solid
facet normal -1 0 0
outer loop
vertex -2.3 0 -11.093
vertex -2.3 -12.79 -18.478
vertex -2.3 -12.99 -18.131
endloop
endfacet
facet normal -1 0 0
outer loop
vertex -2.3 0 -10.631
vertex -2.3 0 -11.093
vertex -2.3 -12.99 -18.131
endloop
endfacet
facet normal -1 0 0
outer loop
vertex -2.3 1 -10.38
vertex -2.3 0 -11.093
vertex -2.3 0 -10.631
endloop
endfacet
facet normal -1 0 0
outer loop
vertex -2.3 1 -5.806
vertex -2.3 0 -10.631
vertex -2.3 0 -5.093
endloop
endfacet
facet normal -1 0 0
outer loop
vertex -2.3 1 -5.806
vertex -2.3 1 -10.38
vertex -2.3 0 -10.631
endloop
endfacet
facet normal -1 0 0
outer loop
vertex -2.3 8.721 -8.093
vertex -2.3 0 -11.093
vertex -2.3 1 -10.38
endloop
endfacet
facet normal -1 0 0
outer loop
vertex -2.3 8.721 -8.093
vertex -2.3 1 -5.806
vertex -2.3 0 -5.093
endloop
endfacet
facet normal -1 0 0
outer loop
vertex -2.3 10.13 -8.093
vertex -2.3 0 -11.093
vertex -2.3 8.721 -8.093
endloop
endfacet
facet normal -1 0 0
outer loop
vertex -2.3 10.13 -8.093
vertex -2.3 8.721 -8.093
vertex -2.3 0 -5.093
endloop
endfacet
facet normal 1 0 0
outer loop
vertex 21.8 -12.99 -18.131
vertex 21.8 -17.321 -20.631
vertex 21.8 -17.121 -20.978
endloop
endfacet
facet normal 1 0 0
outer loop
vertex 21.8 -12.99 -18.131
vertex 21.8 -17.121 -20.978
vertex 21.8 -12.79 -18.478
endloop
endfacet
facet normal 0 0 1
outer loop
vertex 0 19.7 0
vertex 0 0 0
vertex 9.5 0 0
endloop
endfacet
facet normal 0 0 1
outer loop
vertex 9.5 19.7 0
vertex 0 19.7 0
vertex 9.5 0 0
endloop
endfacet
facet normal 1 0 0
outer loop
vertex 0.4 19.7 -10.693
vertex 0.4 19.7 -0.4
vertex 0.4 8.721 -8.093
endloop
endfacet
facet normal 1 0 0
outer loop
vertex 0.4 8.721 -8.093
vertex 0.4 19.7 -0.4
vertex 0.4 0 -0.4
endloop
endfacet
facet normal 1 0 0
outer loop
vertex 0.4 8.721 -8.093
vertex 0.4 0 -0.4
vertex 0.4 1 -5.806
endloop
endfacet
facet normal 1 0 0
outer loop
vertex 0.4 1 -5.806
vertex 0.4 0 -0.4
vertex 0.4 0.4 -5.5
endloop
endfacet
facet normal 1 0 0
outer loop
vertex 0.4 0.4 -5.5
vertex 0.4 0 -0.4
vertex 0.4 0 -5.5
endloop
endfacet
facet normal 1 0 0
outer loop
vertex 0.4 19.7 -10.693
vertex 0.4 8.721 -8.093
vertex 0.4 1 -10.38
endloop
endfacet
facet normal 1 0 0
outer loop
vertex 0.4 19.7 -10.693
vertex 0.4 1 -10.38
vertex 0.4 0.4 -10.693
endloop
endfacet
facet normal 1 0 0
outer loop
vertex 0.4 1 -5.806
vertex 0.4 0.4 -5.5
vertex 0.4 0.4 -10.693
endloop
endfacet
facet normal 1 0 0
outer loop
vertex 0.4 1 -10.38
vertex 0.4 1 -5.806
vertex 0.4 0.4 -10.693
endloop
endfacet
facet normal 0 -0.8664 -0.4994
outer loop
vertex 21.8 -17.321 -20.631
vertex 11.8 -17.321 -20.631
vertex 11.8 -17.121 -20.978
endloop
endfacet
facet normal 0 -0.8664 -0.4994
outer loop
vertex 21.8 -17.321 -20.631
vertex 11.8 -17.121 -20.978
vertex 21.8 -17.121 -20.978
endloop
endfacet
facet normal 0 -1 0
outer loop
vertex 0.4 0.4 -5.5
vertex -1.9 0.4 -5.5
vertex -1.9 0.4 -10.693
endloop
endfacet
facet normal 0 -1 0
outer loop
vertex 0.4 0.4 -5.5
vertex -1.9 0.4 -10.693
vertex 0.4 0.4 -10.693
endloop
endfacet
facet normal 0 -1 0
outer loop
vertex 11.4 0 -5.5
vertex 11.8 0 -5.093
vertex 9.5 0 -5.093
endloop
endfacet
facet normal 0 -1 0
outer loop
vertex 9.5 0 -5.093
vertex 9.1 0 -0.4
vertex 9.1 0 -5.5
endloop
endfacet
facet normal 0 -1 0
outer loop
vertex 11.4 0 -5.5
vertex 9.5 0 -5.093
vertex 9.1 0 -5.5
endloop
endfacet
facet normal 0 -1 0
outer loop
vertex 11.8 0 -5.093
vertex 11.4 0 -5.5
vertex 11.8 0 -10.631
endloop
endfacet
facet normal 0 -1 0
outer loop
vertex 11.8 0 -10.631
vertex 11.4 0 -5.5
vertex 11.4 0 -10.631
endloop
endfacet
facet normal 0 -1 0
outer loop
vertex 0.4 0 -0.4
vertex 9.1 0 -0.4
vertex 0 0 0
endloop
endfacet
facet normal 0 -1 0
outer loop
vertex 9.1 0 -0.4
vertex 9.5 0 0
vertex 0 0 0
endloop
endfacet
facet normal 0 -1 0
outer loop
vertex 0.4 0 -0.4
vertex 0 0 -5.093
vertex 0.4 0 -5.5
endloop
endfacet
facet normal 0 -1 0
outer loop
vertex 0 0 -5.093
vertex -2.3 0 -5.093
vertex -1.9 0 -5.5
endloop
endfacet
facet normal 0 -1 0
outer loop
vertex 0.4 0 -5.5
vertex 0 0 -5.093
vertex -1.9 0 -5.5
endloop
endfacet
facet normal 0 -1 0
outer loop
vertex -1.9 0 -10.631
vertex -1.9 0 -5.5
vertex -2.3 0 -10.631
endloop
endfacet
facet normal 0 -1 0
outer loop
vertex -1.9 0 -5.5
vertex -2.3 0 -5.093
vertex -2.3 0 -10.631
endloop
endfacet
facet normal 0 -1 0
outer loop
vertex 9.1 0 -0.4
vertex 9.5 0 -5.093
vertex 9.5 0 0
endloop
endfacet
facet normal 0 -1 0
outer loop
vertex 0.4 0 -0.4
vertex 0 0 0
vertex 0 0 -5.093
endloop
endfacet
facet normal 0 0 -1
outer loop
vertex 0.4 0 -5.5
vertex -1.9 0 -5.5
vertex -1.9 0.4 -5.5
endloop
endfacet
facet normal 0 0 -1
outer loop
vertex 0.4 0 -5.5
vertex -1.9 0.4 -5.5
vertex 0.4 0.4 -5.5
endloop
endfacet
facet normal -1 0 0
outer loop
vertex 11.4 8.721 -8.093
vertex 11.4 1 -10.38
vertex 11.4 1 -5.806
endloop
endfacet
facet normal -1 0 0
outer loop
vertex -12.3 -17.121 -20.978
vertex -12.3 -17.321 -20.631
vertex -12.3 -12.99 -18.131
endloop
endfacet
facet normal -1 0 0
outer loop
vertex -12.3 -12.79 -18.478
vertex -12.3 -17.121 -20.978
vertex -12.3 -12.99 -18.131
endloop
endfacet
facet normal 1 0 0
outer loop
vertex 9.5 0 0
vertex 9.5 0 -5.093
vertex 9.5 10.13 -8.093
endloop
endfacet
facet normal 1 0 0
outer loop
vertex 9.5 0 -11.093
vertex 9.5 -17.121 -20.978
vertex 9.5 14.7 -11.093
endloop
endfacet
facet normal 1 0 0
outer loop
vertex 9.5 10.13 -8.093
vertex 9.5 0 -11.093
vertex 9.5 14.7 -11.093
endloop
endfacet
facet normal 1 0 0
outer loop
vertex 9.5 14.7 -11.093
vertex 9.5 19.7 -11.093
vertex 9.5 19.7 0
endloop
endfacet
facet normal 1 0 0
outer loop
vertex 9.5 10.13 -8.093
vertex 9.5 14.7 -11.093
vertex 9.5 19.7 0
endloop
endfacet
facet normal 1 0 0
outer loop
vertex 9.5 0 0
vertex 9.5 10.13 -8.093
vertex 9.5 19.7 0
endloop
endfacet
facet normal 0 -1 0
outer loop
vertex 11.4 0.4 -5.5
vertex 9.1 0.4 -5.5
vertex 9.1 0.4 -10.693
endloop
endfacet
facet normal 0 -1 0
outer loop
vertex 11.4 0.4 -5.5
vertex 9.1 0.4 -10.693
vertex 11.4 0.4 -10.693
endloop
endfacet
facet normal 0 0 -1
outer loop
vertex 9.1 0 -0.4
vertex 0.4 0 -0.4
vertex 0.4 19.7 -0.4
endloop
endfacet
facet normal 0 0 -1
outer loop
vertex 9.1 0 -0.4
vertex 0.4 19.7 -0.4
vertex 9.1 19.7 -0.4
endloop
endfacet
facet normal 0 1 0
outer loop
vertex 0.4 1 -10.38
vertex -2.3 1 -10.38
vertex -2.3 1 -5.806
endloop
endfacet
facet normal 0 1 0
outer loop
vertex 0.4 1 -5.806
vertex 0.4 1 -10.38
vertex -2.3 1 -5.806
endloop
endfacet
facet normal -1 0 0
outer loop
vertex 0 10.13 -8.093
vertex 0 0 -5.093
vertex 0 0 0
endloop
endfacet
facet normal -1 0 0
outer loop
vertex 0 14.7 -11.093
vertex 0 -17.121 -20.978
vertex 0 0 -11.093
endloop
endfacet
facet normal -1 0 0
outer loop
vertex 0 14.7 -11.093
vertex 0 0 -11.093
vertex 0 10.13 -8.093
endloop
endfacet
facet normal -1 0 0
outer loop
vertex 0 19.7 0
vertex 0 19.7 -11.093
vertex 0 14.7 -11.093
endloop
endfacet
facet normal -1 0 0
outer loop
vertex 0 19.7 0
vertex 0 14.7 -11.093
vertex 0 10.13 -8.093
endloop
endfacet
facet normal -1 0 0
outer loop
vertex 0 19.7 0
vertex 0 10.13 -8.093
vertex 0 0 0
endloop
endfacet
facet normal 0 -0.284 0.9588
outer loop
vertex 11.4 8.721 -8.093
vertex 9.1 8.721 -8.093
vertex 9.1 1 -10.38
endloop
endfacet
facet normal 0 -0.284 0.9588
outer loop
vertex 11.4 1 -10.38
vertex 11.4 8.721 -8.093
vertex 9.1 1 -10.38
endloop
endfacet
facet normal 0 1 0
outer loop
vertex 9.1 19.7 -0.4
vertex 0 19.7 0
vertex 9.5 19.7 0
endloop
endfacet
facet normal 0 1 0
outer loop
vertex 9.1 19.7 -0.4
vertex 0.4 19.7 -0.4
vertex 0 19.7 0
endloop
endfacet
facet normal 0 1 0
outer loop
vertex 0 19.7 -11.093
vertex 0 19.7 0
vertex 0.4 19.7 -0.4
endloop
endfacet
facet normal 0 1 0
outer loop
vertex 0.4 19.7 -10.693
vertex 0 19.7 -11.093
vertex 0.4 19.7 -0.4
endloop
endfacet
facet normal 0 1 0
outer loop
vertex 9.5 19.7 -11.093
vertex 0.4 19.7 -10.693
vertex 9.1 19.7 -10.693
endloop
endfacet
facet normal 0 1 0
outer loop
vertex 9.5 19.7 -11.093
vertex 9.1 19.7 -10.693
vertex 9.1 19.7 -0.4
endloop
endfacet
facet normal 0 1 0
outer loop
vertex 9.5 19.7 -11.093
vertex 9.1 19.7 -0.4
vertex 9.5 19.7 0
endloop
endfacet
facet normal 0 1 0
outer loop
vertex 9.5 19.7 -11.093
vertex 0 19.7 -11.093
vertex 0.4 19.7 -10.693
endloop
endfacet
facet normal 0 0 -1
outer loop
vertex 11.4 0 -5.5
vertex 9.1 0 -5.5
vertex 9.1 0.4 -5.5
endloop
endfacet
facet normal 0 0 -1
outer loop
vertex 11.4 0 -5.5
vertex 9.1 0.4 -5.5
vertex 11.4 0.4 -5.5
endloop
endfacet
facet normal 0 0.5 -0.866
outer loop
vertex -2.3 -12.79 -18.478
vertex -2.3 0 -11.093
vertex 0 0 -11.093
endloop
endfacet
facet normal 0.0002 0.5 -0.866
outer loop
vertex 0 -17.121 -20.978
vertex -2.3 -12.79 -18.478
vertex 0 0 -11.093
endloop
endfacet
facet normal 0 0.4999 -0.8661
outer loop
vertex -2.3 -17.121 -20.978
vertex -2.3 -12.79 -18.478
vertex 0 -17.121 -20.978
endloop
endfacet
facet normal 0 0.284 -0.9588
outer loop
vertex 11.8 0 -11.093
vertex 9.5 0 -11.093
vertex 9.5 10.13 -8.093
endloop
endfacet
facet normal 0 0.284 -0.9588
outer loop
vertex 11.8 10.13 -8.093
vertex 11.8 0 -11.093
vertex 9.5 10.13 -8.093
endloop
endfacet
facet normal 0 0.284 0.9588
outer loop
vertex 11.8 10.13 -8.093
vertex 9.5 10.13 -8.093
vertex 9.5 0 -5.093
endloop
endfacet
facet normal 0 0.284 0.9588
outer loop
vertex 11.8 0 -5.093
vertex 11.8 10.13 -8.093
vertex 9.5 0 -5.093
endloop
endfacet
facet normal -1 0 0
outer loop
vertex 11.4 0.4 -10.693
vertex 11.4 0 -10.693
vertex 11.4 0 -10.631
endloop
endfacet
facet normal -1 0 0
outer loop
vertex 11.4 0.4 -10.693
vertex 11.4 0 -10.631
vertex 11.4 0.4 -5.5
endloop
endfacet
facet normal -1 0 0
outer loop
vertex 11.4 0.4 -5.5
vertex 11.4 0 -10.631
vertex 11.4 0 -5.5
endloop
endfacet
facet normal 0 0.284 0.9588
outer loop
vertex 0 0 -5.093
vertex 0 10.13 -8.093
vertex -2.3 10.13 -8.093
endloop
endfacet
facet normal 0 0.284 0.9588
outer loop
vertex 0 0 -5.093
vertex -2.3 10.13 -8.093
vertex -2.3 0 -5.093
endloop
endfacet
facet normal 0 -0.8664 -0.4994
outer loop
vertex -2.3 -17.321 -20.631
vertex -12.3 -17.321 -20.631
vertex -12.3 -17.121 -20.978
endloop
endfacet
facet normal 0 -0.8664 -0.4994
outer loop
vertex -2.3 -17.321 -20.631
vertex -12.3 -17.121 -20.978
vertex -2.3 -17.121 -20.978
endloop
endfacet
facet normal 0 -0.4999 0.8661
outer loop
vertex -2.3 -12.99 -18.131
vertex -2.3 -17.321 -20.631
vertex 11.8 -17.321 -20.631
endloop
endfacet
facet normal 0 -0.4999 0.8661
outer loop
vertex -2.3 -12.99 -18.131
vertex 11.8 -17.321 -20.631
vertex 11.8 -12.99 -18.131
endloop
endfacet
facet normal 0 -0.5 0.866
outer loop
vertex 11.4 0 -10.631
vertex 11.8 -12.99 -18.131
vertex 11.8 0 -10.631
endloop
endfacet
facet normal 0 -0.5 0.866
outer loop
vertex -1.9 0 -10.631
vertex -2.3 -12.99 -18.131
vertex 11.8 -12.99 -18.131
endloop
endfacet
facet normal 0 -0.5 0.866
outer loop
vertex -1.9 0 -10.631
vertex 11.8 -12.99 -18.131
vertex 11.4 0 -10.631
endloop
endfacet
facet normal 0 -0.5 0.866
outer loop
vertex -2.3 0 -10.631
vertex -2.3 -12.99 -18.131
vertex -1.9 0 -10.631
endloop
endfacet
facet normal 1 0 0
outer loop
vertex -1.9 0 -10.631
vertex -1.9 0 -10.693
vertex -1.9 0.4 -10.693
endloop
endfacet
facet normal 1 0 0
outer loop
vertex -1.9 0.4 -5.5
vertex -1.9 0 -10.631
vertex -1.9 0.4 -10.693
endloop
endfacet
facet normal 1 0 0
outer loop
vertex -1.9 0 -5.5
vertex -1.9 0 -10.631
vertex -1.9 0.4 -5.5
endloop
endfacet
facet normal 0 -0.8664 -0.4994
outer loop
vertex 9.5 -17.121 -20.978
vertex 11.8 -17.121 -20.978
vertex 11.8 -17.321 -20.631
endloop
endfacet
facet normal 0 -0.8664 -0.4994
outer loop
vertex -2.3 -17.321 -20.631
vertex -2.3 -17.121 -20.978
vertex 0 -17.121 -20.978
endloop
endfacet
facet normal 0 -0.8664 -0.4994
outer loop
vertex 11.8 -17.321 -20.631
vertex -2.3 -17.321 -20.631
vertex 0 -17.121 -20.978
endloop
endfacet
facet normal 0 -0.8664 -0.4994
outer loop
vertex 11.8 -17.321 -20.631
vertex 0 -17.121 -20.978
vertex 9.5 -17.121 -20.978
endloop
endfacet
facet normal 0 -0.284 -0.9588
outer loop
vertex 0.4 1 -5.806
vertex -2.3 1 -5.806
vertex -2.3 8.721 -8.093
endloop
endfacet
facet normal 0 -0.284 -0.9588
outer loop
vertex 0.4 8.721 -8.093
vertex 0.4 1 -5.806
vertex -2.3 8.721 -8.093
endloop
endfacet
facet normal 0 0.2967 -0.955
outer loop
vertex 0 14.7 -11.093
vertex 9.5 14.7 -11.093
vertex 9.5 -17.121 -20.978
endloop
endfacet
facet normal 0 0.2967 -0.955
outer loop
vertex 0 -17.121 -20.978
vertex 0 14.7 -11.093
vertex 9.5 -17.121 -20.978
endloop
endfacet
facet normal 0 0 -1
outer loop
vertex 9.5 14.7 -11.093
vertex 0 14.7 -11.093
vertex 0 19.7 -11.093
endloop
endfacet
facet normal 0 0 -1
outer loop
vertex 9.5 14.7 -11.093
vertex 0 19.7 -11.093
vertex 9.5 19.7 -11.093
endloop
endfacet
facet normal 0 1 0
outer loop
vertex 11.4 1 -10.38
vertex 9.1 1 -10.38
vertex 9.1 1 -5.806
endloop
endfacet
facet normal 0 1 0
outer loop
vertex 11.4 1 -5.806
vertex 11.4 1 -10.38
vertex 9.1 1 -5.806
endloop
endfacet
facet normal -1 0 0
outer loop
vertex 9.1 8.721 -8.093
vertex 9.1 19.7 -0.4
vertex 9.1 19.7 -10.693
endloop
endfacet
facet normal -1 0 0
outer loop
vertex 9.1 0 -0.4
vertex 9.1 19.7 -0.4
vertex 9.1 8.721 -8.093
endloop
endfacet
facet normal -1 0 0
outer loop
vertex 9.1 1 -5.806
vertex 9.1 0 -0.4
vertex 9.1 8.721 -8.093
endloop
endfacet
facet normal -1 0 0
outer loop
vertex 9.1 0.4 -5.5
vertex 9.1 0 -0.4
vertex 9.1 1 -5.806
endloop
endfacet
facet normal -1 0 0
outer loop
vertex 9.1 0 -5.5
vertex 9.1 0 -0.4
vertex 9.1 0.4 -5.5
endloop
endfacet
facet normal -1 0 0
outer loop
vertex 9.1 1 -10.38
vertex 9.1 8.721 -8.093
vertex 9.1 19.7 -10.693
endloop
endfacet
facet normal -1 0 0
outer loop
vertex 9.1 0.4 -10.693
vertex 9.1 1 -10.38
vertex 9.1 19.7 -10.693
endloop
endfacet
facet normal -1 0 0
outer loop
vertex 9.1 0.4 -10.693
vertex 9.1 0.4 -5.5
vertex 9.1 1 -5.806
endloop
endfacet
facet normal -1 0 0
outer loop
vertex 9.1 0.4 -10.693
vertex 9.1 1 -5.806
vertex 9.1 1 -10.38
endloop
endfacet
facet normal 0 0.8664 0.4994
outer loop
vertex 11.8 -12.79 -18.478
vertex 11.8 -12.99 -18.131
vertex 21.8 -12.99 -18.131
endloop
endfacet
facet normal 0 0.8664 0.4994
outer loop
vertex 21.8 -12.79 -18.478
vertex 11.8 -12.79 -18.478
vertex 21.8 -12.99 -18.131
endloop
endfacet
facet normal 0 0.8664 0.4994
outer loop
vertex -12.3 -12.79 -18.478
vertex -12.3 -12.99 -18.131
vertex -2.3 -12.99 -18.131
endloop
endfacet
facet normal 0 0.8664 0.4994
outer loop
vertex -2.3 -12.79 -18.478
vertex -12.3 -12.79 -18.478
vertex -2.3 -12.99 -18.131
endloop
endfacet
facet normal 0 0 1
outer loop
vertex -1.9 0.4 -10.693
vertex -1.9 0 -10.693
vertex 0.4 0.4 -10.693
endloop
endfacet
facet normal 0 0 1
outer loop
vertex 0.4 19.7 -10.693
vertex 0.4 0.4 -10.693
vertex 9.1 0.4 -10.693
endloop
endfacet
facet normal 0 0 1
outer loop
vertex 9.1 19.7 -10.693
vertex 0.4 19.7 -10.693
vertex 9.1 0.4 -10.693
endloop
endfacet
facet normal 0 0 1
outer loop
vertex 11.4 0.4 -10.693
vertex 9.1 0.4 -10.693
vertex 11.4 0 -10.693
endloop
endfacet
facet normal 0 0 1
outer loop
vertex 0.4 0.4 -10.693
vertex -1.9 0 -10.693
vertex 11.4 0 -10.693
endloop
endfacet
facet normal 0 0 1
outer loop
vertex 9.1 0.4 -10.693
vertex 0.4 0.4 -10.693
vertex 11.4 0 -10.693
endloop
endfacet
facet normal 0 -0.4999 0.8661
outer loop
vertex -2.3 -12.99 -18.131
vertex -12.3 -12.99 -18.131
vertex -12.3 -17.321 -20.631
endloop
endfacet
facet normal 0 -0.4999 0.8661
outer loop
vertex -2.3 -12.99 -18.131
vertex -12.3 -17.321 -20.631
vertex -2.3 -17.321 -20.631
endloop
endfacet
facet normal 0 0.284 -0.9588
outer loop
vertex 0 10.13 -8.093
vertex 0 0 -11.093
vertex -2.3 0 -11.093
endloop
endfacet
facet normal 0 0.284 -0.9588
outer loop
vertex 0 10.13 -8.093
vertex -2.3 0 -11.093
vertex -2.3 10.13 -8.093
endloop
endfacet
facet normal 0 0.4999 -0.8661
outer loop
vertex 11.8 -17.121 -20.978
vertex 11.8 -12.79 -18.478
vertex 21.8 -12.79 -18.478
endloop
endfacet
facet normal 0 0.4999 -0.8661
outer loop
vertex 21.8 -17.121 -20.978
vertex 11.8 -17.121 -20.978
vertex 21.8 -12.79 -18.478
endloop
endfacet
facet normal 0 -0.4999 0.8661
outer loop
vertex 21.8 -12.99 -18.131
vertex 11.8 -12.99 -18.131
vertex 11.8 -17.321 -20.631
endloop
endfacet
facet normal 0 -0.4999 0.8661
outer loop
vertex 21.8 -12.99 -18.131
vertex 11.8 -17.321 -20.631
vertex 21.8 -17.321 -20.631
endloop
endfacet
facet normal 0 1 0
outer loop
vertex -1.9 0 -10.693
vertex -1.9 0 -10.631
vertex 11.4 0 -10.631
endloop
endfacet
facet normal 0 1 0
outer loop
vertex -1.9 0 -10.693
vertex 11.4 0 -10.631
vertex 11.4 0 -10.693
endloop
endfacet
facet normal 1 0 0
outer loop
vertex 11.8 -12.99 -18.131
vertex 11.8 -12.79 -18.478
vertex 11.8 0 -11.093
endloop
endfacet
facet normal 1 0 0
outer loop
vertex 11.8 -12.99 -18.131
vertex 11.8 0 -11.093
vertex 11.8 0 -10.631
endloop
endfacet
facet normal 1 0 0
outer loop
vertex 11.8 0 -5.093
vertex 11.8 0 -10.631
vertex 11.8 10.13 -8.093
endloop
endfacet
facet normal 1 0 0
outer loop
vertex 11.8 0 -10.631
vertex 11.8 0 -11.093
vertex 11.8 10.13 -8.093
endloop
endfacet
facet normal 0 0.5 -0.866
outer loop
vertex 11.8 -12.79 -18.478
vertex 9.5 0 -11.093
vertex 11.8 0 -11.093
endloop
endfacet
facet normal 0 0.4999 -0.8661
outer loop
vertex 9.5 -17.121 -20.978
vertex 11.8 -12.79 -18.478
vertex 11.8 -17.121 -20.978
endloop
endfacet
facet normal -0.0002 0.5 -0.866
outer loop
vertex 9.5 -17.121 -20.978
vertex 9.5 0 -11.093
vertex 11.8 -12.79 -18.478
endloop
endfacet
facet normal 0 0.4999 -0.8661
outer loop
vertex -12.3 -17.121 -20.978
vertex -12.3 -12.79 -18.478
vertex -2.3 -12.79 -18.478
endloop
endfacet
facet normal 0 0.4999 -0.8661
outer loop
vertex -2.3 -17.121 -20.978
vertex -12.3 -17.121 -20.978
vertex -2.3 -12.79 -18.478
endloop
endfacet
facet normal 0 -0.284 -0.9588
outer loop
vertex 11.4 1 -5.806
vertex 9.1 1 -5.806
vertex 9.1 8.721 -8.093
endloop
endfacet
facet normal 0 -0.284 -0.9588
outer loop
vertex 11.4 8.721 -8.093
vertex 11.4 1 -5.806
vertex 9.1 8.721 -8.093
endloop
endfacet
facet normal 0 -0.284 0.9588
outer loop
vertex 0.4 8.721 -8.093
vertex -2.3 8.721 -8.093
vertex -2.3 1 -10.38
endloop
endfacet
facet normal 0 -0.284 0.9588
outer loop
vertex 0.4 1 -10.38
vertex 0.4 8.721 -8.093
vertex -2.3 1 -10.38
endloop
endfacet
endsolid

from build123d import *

# Parameters (mm, degrees)
SKIZZE1_W                       = 9.5
SKIZZE1_H                       = 11.093
SKIZZE1_W_2                     = 8.7
SKIZZE1_H_2                     = 4.7
SKIZZE1_H_3                     = 5.193
AUFSATZ_LINEAR_AUSTRAGEN1_DEPTH = 19.7
AUFSATZ_LINEAR_AUSTRAGEN2_DEPTH = 2.3
SCHNITT_LINEAR_AUSTRAGEN1_DEPTH = 13.7
SKIZZE4_W                       = 13.3
SKIZZE4_H                       = 5.193
SCHNITT_LINEAR_AUSTRAGEN2_DEPTH = 0.4
AUFSATZ_LINEAR_AUSTRAGEN3_DEPTH = 14.1
AUFSATZ_LINEAR_START            = -9.5
AUFSATZ_LINEAR_AUSTRAGEN4_DEPTH = 9.5
SCHNITT_LINEAR_AUSTRAGEN3_REACH = 39.021
SKIZZE7_W                       = 8.7
SKIZZE7_H                       = 0.4
SKIZZE8_W                       = 10
SKIZZE8_H                       = 5
AUFSATZ_LINEAR_AUSTRAGEN5_DEPTH = 0.4


with BuildPart() as part:
    # Skizze1 → Aufsatz-Linear austragen1 (new body)
    with BuildSketch(Plane(origin=(0, 0, 0), x_dir=(1, 0, 0), z_dir=(0, 1, 0))):
        with Locations((4.75, 5.5465)):
            Rectangle(SKIZZE1_W, SKIZZE1_H)
        with Locations((4.75, 2.75)):
            Rectangle(SKIZZE1_W_2, SKIZZE1_H_2, mode=Mode.SUBTRACT)
        with Locations((4.75, 8.0965)):
            Rectangle(SKIZZE1_W_2, SKIZZE1_H_3, mode=Mode.SUBTRACT)
    extrude(amount=AUFSATZ_LINEAR_AUSTRAGEN1_DEPTH)

    # Skizze2 → Aufsatz-Linear austragen2 (add)
    with BuildSketch(Plane.ZY):
        Polygon((-11.093, 0), (-8.093, 10.13), (-5.093, 0), align=None)
    aufsatz_linear_austragen2 = extrude(amount=AUFSATZ_LINEAR_AUSTRAGEN2_DEPTH)

    # Spiegeln1: Aufsatz-Linear austragen2 across plane
    add(aufsatz_linear_austragen2.mirror(Plane(origin=(4.75, 0, 0), x_dir=(0, 0, 1), z_dir=(1, 0, 0))))

    # Skizze3 → Schnitt-Linear austragen1 (cut)
    with BuildSketch(Plane.ZY.offset(2.3)):
        Polygon((-10.379677593, 1), (-5.806322407, 1), (-8.093, 8.721348004), align=None)
    extrude(amount=-SCHNITT_LINEAR_AUSTRAGEN1_DEPTH, mode=Mode.SUBTRACT)

    # Skizze4 → Schnitt-Linear austragen2 (cut)
    with BuildSketch(Plane.XZ):
        with Locations((4.75, -8.0965)):
            Rectangle(SKIZZE4_W, SKIZZE4_H)
    extrude(amount=-SCHNITT_LINEAR_AUSTRAGEN2_DEPTH, mode=Mode.SUBTRACT)

    # Skizze5 → Aufsatz-Linear austragen3 (add)
    with BuildSketch(Plane.ZY.offset(2.3)):
        Polygon((-20.977529946, -17.120508076), (-20.631119785, -17.320508076), (-10.631119785, 0), (-11.093, 0), align=None)
    extrude(amount=-AUFSATZ_LINEAR_AUSTRAGEN3_DEPTH)

    # Skizze6 → Aufsatz-Linear austragen4 (add)
    with BuildSketch(Plane.ZY.offset(AUFSATZ_LINEAR_START)):
        Polygon((-20.977529946, -17.120508076), (-11.093, 0), (-11.093, 14.7), align=None)
    extrude(amount=AUFSATZ_LINEAR_AUSTRAGEN4_DEPTH)

    # Skizze7 → Schnitt-Linear austragen3 (cut, up to next)
    with BuildSketch(Plane(origin=(0, 19.7, 0), x_dir=(1, 0, 0), z_dir=(0, 1, 0)), mode=Mode.PRIVATE) as schnitt_linear_austragen3_sk1:
        with Locations((4.75, 5.3)):
            Rectangle(SKIZZE7_W, SKIZZE7_H)
    schnitt_linear_austragen3_tool1 = extrude(schnitt_linear_austragen3_sk1.sketch, amount=-SCHNITT_LINEAR_AUSTRAGEN3_REACH, mode=Mode.PRIVATE) & part.part
    add(schnitt_linear_austragen3_tool1.solids().sort_by_distance((4.75, 19.7, -5.3))[0], mode=Mode.SUBTRACT)

    # Skizze8 → Aufsatz-Linear austragen5 (add)
    with BuildSketch(Plane(origin=(0, 4.603409902, -7.973339838), x_dir=(1, 0, 0), z_dir=(0, -0.5, 0.866025404))):
        with Locations((-7.3, -22.815559892)):
            Rectangle(SKIZZE8_W, SKIZZE8_H)
        with Locations((16.8, -22.815559892)):
            Rectangle(SKIZZE8_W, SKIZZE8_H)
    extrude(amount=-AUFSATZ_LINEAR_AUSTRAGEN5_DEPTH)


solid = part.part
